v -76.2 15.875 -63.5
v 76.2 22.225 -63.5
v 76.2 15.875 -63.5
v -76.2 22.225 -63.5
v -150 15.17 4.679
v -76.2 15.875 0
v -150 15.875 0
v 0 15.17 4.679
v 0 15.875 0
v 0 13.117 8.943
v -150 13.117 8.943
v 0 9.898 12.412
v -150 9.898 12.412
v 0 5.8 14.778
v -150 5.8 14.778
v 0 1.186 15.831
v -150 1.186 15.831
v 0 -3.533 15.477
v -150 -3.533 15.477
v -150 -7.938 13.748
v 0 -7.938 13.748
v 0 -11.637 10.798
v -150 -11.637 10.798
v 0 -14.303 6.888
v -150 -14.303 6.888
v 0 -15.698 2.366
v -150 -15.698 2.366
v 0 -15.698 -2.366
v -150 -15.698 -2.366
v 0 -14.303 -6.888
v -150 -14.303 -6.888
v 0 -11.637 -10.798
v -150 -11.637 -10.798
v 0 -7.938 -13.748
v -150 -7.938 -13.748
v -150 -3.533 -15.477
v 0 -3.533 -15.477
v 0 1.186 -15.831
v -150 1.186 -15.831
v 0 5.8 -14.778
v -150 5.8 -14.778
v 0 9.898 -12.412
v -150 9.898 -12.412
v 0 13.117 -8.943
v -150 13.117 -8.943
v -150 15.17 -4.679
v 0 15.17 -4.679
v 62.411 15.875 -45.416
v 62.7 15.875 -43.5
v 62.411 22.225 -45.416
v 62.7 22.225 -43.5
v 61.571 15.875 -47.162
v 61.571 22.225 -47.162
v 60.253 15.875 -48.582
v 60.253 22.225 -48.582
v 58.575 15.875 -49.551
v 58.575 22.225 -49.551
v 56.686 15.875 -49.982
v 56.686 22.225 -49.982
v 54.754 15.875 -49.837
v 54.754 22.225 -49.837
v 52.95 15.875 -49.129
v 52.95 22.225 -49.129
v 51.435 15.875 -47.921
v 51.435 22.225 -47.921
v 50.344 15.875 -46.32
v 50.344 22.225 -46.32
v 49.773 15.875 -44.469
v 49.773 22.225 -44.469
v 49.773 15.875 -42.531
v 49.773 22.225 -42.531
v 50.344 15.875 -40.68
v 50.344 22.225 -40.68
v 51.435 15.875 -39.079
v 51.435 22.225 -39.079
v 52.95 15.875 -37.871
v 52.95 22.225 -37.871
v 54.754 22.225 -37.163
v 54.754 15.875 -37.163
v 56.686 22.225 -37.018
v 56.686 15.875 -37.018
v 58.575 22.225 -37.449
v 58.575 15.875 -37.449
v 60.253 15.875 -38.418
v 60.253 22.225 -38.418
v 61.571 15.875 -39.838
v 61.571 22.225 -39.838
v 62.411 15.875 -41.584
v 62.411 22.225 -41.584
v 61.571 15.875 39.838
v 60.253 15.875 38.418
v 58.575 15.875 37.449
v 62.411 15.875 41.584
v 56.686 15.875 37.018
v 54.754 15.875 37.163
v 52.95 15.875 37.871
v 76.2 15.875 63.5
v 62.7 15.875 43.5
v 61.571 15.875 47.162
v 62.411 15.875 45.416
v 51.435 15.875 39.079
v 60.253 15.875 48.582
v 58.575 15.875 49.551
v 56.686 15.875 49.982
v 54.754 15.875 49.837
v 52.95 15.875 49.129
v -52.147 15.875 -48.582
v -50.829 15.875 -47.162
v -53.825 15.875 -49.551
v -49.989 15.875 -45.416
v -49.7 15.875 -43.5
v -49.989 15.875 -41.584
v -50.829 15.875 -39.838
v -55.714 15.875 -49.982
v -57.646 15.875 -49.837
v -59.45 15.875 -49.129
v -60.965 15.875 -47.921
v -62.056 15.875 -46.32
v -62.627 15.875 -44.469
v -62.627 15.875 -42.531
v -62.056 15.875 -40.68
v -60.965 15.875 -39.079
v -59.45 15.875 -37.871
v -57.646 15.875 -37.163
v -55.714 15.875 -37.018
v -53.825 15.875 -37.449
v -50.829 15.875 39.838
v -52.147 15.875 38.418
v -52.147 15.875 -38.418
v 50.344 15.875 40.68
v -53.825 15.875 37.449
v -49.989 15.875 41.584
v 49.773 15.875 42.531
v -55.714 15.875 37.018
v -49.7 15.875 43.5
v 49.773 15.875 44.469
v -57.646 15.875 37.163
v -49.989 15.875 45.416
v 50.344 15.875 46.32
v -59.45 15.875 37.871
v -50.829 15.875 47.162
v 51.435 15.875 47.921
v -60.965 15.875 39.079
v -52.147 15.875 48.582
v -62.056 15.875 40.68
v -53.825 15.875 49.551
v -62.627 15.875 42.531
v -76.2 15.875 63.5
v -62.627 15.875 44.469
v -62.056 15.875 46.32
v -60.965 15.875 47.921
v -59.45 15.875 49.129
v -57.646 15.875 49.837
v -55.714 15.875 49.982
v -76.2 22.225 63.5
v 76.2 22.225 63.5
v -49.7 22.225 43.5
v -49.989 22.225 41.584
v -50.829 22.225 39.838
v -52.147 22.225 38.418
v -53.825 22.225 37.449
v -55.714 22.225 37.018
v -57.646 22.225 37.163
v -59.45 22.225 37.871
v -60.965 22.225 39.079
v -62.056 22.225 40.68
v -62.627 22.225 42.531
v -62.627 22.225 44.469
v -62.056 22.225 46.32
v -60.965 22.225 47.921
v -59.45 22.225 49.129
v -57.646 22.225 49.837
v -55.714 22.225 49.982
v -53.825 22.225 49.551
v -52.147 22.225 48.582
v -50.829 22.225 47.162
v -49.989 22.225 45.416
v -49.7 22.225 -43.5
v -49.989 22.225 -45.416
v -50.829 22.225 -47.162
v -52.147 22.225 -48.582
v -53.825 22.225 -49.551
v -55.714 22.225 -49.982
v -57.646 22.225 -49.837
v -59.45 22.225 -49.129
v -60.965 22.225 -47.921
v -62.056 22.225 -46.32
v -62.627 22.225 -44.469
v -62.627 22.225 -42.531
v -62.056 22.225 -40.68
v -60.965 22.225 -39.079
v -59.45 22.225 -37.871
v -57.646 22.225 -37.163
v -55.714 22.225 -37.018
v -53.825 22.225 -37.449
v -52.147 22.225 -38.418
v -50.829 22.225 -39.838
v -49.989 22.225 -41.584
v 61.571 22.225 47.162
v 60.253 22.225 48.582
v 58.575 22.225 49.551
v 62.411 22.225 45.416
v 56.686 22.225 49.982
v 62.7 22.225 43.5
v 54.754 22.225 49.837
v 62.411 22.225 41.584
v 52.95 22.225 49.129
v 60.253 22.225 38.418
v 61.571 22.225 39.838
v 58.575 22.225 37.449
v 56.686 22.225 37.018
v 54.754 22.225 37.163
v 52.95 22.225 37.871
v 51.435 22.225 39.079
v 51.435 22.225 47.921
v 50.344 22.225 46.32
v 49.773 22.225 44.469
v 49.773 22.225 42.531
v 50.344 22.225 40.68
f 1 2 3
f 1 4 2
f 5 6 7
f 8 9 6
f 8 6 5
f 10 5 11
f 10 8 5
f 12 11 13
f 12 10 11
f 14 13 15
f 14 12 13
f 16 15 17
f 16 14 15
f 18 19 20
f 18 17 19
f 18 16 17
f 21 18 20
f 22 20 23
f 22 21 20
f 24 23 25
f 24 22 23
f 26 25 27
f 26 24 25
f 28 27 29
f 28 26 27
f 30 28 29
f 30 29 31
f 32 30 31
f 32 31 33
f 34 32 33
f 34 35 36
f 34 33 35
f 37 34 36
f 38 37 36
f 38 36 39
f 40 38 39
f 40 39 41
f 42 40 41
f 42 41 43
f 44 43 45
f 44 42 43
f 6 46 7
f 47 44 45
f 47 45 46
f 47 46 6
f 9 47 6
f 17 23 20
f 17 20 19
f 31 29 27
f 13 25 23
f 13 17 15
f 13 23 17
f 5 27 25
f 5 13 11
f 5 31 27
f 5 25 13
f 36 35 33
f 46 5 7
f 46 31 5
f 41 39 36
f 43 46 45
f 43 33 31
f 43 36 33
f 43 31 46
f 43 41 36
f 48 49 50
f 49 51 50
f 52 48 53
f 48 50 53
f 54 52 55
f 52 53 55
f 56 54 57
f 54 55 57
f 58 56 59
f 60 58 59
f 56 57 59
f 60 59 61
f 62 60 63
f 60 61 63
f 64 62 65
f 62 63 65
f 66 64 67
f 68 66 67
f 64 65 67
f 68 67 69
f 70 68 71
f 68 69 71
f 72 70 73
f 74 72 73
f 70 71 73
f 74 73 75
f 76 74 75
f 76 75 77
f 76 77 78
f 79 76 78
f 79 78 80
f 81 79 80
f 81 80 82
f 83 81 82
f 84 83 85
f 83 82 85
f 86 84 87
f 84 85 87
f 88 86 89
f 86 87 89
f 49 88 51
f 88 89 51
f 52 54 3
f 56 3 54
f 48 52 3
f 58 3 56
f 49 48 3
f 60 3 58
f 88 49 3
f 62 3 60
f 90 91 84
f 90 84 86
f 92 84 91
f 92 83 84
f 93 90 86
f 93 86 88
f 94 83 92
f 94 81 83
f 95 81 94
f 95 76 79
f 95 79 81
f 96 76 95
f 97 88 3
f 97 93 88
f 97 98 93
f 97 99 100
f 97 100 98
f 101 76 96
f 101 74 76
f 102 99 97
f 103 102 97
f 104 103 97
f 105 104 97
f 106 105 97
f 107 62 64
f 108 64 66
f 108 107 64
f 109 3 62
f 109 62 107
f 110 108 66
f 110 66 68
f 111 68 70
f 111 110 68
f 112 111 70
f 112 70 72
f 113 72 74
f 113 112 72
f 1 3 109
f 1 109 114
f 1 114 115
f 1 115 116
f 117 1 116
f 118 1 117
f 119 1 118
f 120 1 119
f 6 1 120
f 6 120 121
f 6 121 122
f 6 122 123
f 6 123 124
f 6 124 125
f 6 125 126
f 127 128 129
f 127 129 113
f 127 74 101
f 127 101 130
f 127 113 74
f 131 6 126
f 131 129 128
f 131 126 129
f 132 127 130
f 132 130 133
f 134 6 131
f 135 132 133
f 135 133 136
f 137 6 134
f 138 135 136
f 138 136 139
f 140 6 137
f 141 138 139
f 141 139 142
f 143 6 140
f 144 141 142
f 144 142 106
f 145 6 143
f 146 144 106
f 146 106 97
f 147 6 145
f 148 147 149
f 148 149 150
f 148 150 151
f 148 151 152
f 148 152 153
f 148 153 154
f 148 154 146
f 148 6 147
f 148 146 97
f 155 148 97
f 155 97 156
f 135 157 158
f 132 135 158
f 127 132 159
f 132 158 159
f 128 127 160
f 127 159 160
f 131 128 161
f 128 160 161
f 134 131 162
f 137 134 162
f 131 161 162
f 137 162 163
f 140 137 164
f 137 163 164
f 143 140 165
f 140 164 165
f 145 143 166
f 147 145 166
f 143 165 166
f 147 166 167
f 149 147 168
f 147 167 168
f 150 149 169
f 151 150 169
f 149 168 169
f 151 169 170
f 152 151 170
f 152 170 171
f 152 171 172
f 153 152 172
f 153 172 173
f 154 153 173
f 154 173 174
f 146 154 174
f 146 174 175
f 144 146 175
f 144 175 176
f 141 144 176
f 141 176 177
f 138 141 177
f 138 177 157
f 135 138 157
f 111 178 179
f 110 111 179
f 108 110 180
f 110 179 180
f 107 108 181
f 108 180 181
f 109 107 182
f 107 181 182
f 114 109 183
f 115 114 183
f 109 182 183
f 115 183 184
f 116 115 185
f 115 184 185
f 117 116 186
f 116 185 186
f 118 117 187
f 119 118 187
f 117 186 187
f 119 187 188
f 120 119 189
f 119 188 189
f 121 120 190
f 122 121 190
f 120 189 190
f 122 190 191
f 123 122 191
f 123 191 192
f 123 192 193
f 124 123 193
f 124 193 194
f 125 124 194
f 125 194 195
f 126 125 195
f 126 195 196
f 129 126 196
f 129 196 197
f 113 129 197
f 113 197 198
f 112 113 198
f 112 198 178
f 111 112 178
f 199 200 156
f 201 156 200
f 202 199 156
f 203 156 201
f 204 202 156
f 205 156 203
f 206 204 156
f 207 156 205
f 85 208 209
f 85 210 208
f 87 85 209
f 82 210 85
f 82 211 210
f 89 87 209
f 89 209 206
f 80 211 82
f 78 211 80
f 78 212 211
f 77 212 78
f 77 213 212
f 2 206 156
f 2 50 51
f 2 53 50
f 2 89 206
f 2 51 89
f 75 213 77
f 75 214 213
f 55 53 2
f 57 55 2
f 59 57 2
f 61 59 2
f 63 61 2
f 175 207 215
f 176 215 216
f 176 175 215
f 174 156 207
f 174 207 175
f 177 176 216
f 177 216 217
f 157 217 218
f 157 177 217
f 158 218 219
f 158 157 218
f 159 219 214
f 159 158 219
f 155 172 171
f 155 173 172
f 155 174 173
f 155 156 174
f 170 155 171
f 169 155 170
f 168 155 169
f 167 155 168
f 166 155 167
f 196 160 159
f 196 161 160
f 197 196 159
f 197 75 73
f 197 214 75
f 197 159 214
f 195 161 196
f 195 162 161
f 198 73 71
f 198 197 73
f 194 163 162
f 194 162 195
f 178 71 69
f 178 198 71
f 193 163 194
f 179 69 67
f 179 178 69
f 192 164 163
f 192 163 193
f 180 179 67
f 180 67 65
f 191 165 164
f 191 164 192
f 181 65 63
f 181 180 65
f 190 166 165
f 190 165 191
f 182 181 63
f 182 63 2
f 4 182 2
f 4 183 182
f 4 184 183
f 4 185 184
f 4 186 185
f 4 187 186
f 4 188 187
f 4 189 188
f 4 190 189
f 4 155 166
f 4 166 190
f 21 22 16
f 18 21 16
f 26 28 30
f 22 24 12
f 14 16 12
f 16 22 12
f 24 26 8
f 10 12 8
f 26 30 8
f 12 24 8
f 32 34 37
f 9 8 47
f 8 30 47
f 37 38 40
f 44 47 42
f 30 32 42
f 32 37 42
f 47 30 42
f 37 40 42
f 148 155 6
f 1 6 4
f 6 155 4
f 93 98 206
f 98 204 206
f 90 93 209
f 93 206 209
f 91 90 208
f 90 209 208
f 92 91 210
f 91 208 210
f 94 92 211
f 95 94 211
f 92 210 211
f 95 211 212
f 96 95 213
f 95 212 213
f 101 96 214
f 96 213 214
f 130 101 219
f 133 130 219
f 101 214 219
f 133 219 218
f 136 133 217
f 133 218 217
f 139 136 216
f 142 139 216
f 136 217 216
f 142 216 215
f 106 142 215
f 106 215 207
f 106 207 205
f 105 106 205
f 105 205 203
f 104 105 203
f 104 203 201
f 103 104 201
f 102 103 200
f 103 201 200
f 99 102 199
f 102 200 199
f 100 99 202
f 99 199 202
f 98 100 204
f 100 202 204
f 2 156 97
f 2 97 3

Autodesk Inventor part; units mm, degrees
ref_plane "YZ Plane" through (0, 0, 0) normal (1, 0, 0) x (0, 1, 0)
ref_plane "XZ Plane" through (0, 0, 0) normal (0, 1, 0) x (-1, 0, 0)
ref_plane "XY Plane" through (0, 0, 0) normal (0, 0, 1) x (1, 0, 0)
sketch "Sketch1" plane through (0, 0, 0) normal (0, 0, 1) x (1, 0, 0)
  line L0 (0, 0) -> (-150, 0)
  line L1 (-150, 0) -> (-150, 15.875)
  line L2 (-150, 15.875) -> (0, 15.875)
  line L3 (0, 15.875) -> (0, 0)
  dimension "d0" = 150
  dimension "d1" = 15.875
revolve "Revolution1" add sketch "Sketch1" angle 360 about axis through (0, 0, 0) along (-1, 0, 0)
sketch "Sketch2" plane through (0, 0, 0) normal (1, 0, 0) x (0, 0, -1)
  circle A0 centre (0, 0) radius 15.875 projected
  line L0 (0, 15.875) -> (-63.5, 15.875)
  line L1 (0, 15.875) -> (63.5, 15.875)
  line L2 (0, 15.875) -> (-63.5, 15.875) construction
  line L3 (0, 15.875) -> (63.5, 15.875) construction
  line L4 (-63.5, 15.875) -> (-63.5, 22.225)
  line L5 (-63.5, 22.225) -> (63.5, 22.225)
  line L6 (63.5, 22.225) -> (63.5, 15.875)
  dimension "d3" = 63.5
  dimension "d5" = 6.35
extrude "Extrusion1" add sketch "Sketch2" along normal mid plane 152.4 contours L0 L4 L5 L6 L1
sketch "Sketch3" plane through (-76.2, 22.225, 63.5) normal (0, 1, 0) x (1, 0, 0)
  circle A0 centre (20, 107) radius 6.5
  circle A1 centre (132.4, 107) radius 6.5
  circle A2 centre (132.4, 20) radius 6.5
  circle A3 centre (20, 20) radius 6.5
  line L0 (0, 0) -> (0, 127) projected
  line L1 (0, 127) -> (152.4, 127) projected
  line L2 (20, 107) -> (0, 107) construction
  line L3 (20, 107) -> (20, 127) construction
  line L4 (152.4, 127) -> (0, 127) construction
  line L5 (132.4, 107) -> (132.4, 127) construction
  line L6 (132.4, 107) -> (152.4, 107) construction
  line L7 (152.4, 127) -> (152.4, 0) construction
  line L8 (20, 20) -> (0, 20) construction
  line L9 (20, 20) -> (20, 0) construction
  line L10 (0, 0) -> (152.4, 0) construction
  line L11 (132.4, 20) -> (152.4, 20) construction
  line L12 (132.4, 20) -> (132.4, 0) construction
  point P0 (76.2, 63.5)
  dimension "d8" = 13
  dimension "d9" = 13
  dimension "d10" = 13
  dimension "d11" = 13
  dimension "d16" = 20
extrude "Extrusion2" cut sketch "Sketch3" against normal through all
properties part number "Spindle"
